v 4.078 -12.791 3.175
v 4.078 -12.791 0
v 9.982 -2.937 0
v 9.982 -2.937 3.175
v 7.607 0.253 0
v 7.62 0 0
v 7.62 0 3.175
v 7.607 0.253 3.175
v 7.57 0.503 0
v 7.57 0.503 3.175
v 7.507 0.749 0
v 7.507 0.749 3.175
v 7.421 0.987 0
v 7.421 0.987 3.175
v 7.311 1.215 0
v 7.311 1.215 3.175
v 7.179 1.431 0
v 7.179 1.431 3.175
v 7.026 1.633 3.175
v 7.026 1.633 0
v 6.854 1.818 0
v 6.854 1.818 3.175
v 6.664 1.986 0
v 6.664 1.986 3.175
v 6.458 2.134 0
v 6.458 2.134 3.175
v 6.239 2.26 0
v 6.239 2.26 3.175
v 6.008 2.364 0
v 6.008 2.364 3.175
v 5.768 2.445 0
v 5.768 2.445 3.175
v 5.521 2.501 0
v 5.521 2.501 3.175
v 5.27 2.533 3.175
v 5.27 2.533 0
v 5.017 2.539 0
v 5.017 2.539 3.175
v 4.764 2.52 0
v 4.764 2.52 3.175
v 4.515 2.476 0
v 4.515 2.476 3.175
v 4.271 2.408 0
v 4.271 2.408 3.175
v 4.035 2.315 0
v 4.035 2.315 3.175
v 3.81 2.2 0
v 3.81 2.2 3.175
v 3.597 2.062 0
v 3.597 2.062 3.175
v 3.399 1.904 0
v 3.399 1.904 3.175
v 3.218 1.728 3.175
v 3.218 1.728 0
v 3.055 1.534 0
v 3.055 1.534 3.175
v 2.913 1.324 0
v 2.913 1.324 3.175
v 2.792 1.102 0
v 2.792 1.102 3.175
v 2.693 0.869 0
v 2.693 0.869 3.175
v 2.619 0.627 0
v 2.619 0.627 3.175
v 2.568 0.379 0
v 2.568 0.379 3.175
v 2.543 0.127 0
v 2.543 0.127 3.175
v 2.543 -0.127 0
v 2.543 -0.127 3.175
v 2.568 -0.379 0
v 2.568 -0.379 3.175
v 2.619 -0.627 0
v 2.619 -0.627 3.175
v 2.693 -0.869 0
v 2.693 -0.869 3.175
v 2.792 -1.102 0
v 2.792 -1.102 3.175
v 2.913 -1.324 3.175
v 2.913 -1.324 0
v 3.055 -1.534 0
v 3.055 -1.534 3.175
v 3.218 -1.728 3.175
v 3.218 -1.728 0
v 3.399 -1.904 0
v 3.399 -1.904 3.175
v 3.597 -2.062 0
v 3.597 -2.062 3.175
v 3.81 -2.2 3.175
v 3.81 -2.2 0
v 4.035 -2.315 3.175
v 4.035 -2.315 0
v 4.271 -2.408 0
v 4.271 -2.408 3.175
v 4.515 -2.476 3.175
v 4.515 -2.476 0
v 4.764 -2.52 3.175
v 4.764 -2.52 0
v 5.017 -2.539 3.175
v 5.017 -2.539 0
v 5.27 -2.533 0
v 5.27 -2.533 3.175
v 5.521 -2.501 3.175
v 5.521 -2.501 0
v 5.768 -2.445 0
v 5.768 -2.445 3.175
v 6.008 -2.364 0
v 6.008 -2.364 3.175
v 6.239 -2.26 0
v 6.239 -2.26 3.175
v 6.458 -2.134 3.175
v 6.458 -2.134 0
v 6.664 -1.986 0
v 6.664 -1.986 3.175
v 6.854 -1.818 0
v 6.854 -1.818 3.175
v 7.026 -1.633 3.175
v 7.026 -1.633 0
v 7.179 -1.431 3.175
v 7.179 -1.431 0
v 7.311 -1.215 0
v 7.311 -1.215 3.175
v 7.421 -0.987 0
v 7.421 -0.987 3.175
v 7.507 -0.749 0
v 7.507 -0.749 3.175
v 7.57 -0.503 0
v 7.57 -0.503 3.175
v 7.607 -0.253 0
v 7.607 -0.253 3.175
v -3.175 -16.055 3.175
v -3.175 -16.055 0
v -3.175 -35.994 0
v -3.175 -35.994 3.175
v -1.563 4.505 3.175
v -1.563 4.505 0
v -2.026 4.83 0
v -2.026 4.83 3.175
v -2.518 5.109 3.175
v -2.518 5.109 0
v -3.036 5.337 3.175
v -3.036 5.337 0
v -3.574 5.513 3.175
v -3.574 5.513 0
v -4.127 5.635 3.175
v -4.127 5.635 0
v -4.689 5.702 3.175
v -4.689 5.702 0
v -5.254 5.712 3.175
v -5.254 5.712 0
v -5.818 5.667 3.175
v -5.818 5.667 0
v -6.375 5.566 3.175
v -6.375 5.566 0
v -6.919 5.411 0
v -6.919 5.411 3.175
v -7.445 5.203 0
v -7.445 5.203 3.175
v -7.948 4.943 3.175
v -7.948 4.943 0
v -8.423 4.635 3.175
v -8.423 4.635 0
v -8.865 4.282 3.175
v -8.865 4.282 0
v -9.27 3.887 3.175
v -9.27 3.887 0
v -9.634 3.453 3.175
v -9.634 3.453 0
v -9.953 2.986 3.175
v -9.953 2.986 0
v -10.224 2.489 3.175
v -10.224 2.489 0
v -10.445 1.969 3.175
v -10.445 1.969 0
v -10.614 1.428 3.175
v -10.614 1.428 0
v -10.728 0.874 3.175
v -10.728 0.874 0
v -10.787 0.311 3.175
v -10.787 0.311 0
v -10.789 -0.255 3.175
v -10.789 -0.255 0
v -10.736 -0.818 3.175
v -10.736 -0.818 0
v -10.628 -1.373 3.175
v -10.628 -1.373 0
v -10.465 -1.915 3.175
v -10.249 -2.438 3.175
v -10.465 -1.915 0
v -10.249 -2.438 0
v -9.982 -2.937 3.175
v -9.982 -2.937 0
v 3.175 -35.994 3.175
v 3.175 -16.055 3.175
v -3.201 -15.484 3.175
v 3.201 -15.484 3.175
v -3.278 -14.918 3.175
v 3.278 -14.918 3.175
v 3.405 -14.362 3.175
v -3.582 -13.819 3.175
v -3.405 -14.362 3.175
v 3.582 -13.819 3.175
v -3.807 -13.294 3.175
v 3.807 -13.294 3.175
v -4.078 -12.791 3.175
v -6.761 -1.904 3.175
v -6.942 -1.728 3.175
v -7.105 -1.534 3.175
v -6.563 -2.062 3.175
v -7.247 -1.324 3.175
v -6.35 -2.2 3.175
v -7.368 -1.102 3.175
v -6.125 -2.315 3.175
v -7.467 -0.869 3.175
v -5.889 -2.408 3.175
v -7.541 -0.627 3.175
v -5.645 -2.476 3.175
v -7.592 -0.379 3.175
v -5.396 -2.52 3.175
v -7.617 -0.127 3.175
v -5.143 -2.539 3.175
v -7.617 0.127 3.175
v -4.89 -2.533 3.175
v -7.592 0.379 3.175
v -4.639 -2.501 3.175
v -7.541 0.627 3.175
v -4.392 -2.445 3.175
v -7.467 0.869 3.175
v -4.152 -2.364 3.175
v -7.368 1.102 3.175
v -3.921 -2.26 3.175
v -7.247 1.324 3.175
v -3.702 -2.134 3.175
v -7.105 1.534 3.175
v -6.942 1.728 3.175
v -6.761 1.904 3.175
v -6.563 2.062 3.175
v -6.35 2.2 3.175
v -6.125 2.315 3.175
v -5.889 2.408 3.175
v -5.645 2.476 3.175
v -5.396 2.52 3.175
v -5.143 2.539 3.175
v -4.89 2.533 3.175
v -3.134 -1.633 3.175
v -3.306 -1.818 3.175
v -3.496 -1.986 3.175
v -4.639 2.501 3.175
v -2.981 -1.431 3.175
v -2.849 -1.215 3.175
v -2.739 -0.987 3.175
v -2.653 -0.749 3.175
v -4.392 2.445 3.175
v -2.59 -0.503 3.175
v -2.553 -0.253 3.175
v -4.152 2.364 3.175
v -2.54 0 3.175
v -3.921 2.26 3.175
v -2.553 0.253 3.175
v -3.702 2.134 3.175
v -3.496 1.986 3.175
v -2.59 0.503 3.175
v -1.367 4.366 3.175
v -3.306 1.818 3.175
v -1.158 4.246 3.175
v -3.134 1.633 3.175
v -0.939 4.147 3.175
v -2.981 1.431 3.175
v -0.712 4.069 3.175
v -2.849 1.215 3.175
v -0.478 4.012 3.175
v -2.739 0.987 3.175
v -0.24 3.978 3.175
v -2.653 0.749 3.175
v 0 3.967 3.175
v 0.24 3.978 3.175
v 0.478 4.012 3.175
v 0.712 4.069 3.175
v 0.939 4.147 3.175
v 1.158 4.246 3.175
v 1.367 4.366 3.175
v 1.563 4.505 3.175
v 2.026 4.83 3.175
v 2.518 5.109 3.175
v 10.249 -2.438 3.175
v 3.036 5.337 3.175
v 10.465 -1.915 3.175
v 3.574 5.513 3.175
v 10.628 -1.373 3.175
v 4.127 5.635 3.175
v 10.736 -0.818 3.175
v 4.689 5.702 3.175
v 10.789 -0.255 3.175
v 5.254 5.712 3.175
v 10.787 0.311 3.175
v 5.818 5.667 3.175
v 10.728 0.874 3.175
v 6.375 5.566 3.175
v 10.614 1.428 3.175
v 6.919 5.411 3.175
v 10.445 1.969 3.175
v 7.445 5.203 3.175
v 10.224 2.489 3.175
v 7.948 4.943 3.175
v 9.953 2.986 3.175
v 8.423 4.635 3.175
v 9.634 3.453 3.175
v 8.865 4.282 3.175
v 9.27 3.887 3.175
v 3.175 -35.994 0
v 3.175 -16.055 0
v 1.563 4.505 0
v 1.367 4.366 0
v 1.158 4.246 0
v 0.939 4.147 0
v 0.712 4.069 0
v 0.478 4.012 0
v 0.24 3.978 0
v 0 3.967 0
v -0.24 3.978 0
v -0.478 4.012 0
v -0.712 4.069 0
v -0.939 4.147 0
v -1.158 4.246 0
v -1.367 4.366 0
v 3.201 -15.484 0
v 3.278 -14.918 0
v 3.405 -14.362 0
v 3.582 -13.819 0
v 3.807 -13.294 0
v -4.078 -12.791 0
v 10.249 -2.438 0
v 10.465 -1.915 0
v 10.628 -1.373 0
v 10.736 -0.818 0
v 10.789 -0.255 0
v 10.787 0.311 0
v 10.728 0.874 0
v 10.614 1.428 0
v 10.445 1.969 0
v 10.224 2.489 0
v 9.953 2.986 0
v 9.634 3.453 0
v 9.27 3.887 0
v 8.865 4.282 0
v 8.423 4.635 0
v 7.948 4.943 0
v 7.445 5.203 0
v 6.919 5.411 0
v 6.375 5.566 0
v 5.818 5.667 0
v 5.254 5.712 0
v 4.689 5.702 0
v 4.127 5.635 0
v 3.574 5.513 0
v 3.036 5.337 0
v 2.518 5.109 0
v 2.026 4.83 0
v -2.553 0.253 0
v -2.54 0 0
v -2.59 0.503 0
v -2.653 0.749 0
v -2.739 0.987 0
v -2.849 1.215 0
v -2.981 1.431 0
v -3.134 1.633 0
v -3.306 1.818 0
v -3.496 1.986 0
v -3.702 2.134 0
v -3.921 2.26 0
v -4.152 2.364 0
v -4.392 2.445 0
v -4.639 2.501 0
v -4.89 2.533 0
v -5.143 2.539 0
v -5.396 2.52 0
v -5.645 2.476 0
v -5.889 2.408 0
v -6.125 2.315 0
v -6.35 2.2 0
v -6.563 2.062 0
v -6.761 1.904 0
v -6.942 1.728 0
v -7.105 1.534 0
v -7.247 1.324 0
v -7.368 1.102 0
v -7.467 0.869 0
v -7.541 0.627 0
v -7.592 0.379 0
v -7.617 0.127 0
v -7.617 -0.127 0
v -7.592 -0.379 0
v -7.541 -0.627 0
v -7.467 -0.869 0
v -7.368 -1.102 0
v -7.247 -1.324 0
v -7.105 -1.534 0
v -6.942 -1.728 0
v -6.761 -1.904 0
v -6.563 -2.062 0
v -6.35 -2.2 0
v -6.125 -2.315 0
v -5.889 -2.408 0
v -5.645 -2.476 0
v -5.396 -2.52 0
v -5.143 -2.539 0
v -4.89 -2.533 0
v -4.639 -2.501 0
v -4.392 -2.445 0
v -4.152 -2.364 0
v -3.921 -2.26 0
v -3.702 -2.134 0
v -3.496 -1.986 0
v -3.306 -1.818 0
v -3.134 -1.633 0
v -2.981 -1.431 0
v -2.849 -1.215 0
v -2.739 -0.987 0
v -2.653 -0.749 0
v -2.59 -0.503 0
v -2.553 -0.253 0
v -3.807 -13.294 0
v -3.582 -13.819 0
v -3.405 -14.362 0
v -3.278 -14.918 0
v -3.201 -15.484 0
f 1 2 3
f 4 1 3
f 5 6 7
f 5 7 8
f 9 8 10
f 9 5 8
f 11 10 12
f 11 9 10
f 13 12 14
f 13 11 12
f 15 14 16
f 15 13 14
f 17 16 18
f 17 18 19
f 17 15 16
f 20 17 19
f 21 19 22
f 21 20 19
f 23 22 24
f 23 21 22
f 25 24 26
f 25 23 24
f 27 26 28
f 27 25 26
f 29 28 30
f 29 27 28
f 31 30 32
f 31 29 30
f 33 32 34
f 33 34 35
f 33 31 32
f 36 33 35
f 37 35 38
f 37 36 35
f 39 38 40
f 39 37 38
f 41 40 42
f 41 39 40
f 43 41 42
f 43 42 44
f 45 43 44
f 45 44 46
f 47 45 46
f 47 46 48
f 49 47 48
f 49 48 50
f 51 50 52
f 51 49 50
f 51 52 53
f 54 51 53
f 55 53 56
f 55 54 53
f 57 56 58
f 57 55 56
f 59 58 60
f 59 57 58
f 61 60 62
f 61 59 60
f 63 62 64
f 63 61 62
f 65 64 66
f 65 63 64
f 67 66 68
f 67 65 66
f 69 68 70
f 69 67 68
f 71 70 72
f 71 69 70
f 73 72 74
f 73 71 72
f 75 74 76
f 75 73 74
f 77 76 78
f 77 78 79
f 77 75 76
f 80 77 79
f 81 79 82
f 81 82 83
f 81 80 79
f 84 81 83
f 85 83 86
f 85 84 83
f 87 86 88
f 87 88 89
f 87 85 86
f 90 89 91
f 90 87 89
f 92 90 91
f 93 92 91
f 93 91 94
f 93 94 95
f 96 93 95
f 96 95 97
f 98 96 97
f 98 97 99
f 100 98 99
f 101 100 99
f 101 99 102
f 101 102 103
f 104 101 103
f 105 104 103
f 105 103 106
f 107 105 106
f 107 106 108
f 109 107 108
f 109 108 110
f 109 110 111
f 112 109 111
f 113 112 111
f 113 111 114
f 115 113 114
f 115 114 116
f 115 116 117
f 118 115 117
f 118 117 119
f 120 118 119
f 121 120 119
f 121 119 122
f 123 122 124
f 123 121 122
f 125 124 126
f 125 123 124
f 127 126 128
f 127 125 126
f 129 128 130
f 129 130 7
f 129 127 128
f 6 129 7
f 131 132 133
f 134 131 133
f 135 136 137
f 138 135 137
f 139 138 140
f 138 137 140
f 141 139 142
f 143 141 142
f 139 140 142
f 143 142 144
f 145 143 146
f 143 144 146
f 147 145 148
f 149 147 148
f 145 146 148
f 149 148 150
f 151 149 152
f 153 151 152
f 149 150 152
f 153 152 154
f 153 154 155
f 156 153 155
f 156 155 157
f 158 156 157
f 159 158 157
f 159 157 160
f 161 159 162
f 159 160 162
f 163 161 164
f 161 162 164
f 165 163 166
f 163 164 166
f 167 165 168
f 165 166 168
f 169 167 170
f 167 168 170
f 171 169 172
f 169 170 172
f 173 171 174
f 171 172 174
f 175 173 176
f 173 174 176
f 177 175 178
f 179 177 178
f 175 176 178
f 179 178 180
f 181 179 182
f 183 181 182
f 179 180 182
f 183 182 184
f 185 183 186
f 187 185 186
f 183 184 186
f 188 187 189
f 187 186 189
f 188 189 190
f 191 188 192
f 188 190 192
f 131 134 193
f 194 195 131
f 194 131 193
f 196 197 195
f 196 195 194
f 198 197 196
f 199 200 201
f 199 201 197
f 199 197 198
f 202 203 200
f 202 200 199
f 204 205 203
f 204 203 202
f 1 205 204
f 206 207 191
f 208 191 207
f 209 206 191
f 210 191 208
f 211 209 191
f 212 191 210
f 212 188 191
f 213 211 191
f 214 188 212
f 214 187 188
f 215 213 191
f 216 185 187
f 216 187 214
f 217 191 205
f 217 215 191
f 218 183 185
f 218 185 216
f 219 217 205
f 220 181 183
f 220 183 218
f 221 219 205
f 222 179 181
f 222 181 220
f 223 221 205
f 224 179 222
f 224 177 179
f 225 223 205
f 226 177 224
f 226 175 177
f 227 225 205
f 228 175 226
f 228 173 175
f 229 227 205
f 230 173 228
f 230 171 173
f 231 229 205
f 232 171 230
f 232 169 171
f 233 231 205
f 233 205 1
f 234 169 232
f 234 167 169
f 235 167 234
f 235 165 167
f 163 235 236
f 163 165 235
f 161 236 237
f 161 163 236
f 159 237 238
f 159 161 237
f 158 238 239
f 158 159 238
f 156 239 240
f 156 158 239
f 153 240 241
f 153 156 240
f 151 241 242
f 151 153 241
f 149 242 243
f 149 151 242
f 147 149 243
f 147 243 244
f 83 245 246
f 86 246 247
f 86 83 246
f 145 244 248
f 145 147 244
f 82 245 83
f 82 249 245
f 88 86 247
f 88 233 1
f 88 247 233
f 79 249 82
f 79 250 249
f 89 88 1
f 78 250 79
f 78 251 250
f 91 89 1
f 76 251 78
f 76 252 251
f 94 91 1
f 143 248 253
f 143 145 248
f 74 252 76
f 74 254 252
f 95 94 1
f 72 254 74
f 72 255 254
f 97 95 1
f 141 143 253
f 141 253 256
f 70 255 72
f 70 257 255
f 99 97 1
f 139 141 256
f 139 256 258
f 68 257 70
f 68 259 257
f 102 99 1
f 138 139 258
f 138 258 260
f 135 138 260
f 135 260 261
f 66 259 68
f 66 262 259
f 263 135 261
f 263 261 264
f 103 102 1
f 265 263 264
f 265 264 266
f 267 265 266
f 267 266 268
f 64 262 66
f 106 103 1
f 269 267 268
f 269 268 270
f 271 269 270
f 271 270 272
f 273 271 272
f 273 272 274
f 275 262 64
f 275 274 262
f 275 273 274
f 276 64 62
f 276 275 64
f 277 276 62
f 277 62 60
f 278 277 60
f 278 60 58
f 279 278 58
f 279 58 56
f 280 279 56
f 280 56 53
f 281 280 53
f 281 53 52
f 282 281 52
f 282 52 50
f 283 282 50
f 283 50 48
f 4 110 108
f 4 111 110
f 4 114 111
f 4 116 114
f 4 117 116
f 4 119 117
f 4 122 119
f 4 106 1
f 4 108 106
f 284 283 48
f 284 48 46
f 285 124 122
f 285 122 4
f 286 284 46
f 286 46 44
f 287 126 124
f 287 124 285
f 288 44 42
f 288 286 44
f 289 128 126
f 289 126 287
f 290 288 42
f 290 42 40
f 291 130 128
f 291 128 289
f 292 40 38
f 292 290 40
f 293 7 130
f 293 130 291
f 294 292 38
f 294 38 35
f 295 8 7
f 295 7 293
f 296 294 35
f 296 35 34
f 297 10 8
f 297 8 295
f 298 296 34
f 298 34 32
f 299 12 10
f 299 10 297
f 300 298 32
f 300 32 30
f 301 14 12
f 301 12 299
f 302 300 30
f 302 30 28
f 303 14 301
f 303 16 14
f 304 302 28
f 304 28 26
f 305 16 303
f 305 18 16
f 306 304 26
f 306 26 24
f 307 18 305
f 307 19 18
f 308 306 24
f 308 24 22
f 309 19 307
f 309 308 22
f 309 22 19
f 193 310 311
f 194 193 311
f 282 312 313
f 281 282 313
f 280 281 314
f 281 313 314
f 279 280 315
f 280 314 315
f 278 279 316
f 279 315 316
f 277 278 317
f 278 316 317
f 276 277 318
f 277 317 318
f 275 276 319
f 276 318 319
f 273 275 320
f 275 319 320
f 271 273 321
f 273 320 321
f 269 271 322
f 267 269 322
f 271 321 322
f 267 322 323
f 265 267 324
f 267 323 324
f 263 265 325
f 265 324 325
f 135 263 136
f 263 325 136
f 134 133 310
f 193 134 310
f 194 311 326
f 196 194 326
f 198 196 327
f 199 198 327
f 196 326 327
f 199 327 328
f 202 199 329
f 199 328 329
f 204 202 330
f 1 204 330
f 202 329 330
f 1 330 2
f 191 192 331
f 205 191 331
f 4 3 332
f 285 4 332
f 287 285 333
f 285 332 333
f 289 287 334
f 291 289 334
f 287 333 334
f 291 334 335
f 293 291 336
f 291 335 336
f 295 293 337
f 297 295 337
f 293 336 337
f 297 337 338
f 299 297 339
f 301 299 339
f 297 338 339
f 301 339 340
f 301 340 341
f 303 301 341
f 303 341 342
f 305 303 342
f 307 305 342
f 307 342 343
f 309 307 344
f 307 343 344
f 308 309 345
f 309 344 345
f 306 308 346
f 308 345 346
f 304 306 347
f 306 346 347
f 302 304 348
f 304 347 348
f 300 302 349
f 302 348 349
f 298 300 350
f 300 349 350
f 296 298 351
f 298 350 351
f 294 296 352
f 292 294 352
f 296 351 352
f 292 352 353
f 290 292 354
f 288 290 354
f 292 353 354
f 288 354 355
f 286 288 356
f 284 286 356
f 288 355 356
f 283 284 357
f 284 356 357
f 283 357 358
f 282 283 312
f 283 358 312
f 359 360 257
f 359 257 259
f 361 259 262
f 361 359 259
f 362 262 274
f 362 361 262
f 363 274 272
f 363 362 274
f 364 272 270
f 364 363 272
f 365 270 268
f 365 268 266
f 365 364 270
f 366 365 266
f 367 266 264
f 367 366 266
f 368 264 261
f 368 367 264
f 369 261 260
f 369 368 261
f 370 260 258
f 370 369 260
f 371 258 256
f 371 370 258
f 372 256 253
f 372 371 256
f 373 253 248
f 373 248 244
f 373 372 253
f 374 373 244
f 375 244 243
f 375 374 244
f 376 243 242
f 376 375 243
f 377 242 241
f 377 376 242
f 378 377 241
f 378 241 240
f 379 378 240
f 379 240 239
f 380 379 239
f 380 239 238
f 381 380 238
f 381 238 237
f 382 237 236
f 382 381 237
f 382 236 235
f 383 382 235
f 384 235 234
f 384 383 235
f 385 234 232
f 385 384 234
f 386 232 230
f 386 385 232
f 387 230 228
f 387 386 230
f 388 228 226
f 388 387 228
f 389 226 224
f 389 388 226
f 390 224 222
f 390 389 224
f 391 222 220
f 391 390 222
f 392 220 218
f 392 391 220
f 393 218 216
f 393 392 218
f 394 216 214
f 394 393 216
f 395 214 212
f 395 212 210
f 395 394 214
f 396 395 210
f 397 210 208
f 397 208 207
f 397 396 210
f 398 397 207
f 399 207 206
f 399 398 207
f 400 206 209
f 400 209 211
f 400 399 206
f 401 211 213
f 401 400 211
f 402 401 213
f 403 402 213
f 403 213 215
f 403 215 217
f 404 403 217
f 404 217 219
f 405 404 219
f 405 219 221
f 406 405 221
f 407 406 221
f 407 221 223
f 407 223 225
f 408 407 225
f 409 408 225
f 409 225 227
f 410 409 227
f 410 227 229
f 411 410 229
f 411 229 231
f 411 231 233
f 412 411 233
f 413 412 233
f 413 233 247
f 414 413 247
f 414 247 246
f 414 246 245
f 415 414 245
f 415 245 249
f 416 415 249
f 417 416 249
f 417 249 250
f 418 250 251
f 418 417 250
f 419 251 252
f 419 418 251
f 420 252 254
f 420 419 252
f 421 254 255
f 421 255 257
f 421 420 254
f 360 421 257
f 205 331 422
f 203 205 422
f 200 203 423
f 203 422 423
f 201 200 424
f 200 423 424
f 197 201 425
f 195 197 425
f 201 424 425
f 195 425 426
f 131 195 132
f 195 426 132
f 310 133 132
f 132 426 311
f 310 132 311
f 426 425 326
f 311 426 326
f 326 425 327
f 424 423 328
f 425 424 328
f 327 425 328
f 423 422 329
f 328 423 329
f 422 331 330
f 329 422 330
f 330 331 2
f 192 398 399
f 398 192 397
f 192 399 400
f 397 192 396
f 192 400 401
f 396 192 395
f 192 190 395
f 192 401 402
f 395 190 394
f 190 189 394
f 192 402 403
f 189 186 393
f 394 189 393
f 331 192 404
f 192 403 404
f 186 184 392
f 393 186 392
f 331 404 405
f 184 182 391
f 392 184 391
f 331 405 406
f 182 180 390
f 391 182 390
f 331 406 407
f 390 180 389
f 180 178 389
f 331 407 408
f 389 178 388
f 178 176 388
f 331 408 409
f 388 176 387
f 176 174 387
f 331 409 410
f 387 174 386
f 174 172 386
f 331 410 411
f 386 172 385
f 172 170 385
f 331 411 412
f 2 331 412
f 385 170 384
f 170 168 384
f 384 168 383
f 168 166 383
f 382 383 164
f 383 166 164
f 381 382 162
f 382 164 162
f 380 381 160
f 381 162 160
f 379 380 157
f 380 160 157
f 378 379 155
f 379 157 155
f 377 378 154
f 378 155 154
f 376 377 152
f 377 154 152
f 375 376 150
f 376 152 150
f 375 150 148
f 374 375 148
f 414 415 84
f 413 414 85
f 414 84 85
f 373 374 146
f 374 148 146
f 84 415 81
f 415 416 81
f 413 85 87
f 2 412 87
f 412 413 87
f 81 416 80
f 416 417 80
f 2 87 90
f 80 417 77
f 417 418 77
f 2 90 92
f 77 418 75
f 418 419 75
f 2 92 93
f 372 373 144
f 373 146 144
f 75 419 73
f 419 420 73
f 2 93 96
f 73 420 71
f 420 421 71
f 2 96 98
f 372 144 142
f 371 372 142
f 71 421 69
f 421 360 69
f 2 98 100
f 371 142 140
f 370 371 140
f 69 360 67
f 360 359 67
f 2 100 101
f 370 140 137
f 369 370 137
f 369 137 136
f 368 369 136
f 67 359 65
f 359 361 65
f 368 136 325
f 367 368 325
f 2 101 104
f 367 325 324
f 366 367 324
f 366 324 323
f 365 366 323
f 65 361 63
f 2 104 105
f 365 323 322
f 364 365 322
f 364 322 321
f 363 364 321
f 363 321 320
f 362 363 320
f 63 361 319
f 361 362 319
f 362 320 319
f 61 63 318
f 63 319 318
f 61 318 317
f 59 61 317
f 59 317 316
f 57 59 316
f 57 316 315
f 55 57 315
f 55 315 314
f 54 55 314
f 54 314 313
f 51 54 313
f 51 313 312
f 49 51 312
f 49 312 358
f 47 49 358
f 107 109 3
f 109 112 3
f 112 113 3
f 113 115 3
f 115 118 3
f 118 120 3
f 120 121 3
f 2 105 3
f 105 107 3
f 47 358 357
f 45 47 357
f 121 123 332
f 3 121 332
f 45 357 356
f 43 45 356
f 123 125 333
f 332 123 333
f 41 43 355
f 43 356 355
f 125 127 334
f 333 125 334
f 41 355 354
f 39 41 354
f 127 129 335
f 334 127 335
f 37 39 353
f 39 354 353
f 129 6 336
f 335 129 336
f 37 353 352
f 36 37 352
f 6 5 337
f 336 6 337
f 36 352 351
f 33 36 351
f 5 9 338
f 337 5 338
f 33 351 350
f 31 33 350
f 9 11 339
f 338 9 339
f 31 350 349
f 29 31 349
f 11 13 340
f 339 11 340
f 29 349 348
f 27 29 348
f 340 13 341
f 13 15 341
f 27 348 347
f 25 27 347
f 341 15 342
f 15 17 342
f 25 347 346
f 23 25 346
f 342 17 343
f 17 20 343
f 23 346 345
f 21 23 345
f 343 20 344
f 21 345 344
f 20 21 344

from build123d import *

# Parameters (mm, degrees)
SKETCH1_R           = 2.54
BOSS_EXTRUDE1_DEPTH = 3.175


with BuildPart() as part:
    # Sketch1 → Boss-Extrude1 (new body)
    with BuildSketch(Plane.XY):
        with BuildLine():
            Line((-9.982299112, -2.937462922), (-4.078000987, -12.791080219))
            ThreePointArc((-4.078000987, -12.791080219), (-3.40491243, -14.361697822), (-3.175, -16.05492791))
            Line((-3.175, -16.05492791), (-3.175, -35.993911504))
            Line((-3.175, -35.993911504), (3.175, -35.993911504))
            Line((3.175, -35.993911504), (3.175, -16.05492791))
            ThreePointArc((3.175, -16.05492791), (3.40491243, -14.361697822), (4.078000987, -12.791080219))
            Line((4.078000987, -12.791080219), (9.982299112, -2.937462922))
            ThreePointArc((9.982299112, -2.937462922), (8.865013598, 4.281926793), (1.563076923, 4.504717202))
            ThreePointArc((1.563076923, 4.504717202), (0, 3.966813736), (-1.563076923, 4.504717202))
            ThreePointArc((-1.563076923, 4.504717202), (-8.865013598, 4.281926793), (-9.982299112, -2.937462922))
        make_face()
        with Locations((5.08, 0)):
            Circle(SKETCH1_R, mode=Mode.SUBTRACT)
        with Locations((-5.08, 0)):
            Circle(SKETCH1_R, mode=Mode.SUBTRACT)
    extrude(amount=BOSS_EXTRUDE1_DEPTH)


solid = part.part
